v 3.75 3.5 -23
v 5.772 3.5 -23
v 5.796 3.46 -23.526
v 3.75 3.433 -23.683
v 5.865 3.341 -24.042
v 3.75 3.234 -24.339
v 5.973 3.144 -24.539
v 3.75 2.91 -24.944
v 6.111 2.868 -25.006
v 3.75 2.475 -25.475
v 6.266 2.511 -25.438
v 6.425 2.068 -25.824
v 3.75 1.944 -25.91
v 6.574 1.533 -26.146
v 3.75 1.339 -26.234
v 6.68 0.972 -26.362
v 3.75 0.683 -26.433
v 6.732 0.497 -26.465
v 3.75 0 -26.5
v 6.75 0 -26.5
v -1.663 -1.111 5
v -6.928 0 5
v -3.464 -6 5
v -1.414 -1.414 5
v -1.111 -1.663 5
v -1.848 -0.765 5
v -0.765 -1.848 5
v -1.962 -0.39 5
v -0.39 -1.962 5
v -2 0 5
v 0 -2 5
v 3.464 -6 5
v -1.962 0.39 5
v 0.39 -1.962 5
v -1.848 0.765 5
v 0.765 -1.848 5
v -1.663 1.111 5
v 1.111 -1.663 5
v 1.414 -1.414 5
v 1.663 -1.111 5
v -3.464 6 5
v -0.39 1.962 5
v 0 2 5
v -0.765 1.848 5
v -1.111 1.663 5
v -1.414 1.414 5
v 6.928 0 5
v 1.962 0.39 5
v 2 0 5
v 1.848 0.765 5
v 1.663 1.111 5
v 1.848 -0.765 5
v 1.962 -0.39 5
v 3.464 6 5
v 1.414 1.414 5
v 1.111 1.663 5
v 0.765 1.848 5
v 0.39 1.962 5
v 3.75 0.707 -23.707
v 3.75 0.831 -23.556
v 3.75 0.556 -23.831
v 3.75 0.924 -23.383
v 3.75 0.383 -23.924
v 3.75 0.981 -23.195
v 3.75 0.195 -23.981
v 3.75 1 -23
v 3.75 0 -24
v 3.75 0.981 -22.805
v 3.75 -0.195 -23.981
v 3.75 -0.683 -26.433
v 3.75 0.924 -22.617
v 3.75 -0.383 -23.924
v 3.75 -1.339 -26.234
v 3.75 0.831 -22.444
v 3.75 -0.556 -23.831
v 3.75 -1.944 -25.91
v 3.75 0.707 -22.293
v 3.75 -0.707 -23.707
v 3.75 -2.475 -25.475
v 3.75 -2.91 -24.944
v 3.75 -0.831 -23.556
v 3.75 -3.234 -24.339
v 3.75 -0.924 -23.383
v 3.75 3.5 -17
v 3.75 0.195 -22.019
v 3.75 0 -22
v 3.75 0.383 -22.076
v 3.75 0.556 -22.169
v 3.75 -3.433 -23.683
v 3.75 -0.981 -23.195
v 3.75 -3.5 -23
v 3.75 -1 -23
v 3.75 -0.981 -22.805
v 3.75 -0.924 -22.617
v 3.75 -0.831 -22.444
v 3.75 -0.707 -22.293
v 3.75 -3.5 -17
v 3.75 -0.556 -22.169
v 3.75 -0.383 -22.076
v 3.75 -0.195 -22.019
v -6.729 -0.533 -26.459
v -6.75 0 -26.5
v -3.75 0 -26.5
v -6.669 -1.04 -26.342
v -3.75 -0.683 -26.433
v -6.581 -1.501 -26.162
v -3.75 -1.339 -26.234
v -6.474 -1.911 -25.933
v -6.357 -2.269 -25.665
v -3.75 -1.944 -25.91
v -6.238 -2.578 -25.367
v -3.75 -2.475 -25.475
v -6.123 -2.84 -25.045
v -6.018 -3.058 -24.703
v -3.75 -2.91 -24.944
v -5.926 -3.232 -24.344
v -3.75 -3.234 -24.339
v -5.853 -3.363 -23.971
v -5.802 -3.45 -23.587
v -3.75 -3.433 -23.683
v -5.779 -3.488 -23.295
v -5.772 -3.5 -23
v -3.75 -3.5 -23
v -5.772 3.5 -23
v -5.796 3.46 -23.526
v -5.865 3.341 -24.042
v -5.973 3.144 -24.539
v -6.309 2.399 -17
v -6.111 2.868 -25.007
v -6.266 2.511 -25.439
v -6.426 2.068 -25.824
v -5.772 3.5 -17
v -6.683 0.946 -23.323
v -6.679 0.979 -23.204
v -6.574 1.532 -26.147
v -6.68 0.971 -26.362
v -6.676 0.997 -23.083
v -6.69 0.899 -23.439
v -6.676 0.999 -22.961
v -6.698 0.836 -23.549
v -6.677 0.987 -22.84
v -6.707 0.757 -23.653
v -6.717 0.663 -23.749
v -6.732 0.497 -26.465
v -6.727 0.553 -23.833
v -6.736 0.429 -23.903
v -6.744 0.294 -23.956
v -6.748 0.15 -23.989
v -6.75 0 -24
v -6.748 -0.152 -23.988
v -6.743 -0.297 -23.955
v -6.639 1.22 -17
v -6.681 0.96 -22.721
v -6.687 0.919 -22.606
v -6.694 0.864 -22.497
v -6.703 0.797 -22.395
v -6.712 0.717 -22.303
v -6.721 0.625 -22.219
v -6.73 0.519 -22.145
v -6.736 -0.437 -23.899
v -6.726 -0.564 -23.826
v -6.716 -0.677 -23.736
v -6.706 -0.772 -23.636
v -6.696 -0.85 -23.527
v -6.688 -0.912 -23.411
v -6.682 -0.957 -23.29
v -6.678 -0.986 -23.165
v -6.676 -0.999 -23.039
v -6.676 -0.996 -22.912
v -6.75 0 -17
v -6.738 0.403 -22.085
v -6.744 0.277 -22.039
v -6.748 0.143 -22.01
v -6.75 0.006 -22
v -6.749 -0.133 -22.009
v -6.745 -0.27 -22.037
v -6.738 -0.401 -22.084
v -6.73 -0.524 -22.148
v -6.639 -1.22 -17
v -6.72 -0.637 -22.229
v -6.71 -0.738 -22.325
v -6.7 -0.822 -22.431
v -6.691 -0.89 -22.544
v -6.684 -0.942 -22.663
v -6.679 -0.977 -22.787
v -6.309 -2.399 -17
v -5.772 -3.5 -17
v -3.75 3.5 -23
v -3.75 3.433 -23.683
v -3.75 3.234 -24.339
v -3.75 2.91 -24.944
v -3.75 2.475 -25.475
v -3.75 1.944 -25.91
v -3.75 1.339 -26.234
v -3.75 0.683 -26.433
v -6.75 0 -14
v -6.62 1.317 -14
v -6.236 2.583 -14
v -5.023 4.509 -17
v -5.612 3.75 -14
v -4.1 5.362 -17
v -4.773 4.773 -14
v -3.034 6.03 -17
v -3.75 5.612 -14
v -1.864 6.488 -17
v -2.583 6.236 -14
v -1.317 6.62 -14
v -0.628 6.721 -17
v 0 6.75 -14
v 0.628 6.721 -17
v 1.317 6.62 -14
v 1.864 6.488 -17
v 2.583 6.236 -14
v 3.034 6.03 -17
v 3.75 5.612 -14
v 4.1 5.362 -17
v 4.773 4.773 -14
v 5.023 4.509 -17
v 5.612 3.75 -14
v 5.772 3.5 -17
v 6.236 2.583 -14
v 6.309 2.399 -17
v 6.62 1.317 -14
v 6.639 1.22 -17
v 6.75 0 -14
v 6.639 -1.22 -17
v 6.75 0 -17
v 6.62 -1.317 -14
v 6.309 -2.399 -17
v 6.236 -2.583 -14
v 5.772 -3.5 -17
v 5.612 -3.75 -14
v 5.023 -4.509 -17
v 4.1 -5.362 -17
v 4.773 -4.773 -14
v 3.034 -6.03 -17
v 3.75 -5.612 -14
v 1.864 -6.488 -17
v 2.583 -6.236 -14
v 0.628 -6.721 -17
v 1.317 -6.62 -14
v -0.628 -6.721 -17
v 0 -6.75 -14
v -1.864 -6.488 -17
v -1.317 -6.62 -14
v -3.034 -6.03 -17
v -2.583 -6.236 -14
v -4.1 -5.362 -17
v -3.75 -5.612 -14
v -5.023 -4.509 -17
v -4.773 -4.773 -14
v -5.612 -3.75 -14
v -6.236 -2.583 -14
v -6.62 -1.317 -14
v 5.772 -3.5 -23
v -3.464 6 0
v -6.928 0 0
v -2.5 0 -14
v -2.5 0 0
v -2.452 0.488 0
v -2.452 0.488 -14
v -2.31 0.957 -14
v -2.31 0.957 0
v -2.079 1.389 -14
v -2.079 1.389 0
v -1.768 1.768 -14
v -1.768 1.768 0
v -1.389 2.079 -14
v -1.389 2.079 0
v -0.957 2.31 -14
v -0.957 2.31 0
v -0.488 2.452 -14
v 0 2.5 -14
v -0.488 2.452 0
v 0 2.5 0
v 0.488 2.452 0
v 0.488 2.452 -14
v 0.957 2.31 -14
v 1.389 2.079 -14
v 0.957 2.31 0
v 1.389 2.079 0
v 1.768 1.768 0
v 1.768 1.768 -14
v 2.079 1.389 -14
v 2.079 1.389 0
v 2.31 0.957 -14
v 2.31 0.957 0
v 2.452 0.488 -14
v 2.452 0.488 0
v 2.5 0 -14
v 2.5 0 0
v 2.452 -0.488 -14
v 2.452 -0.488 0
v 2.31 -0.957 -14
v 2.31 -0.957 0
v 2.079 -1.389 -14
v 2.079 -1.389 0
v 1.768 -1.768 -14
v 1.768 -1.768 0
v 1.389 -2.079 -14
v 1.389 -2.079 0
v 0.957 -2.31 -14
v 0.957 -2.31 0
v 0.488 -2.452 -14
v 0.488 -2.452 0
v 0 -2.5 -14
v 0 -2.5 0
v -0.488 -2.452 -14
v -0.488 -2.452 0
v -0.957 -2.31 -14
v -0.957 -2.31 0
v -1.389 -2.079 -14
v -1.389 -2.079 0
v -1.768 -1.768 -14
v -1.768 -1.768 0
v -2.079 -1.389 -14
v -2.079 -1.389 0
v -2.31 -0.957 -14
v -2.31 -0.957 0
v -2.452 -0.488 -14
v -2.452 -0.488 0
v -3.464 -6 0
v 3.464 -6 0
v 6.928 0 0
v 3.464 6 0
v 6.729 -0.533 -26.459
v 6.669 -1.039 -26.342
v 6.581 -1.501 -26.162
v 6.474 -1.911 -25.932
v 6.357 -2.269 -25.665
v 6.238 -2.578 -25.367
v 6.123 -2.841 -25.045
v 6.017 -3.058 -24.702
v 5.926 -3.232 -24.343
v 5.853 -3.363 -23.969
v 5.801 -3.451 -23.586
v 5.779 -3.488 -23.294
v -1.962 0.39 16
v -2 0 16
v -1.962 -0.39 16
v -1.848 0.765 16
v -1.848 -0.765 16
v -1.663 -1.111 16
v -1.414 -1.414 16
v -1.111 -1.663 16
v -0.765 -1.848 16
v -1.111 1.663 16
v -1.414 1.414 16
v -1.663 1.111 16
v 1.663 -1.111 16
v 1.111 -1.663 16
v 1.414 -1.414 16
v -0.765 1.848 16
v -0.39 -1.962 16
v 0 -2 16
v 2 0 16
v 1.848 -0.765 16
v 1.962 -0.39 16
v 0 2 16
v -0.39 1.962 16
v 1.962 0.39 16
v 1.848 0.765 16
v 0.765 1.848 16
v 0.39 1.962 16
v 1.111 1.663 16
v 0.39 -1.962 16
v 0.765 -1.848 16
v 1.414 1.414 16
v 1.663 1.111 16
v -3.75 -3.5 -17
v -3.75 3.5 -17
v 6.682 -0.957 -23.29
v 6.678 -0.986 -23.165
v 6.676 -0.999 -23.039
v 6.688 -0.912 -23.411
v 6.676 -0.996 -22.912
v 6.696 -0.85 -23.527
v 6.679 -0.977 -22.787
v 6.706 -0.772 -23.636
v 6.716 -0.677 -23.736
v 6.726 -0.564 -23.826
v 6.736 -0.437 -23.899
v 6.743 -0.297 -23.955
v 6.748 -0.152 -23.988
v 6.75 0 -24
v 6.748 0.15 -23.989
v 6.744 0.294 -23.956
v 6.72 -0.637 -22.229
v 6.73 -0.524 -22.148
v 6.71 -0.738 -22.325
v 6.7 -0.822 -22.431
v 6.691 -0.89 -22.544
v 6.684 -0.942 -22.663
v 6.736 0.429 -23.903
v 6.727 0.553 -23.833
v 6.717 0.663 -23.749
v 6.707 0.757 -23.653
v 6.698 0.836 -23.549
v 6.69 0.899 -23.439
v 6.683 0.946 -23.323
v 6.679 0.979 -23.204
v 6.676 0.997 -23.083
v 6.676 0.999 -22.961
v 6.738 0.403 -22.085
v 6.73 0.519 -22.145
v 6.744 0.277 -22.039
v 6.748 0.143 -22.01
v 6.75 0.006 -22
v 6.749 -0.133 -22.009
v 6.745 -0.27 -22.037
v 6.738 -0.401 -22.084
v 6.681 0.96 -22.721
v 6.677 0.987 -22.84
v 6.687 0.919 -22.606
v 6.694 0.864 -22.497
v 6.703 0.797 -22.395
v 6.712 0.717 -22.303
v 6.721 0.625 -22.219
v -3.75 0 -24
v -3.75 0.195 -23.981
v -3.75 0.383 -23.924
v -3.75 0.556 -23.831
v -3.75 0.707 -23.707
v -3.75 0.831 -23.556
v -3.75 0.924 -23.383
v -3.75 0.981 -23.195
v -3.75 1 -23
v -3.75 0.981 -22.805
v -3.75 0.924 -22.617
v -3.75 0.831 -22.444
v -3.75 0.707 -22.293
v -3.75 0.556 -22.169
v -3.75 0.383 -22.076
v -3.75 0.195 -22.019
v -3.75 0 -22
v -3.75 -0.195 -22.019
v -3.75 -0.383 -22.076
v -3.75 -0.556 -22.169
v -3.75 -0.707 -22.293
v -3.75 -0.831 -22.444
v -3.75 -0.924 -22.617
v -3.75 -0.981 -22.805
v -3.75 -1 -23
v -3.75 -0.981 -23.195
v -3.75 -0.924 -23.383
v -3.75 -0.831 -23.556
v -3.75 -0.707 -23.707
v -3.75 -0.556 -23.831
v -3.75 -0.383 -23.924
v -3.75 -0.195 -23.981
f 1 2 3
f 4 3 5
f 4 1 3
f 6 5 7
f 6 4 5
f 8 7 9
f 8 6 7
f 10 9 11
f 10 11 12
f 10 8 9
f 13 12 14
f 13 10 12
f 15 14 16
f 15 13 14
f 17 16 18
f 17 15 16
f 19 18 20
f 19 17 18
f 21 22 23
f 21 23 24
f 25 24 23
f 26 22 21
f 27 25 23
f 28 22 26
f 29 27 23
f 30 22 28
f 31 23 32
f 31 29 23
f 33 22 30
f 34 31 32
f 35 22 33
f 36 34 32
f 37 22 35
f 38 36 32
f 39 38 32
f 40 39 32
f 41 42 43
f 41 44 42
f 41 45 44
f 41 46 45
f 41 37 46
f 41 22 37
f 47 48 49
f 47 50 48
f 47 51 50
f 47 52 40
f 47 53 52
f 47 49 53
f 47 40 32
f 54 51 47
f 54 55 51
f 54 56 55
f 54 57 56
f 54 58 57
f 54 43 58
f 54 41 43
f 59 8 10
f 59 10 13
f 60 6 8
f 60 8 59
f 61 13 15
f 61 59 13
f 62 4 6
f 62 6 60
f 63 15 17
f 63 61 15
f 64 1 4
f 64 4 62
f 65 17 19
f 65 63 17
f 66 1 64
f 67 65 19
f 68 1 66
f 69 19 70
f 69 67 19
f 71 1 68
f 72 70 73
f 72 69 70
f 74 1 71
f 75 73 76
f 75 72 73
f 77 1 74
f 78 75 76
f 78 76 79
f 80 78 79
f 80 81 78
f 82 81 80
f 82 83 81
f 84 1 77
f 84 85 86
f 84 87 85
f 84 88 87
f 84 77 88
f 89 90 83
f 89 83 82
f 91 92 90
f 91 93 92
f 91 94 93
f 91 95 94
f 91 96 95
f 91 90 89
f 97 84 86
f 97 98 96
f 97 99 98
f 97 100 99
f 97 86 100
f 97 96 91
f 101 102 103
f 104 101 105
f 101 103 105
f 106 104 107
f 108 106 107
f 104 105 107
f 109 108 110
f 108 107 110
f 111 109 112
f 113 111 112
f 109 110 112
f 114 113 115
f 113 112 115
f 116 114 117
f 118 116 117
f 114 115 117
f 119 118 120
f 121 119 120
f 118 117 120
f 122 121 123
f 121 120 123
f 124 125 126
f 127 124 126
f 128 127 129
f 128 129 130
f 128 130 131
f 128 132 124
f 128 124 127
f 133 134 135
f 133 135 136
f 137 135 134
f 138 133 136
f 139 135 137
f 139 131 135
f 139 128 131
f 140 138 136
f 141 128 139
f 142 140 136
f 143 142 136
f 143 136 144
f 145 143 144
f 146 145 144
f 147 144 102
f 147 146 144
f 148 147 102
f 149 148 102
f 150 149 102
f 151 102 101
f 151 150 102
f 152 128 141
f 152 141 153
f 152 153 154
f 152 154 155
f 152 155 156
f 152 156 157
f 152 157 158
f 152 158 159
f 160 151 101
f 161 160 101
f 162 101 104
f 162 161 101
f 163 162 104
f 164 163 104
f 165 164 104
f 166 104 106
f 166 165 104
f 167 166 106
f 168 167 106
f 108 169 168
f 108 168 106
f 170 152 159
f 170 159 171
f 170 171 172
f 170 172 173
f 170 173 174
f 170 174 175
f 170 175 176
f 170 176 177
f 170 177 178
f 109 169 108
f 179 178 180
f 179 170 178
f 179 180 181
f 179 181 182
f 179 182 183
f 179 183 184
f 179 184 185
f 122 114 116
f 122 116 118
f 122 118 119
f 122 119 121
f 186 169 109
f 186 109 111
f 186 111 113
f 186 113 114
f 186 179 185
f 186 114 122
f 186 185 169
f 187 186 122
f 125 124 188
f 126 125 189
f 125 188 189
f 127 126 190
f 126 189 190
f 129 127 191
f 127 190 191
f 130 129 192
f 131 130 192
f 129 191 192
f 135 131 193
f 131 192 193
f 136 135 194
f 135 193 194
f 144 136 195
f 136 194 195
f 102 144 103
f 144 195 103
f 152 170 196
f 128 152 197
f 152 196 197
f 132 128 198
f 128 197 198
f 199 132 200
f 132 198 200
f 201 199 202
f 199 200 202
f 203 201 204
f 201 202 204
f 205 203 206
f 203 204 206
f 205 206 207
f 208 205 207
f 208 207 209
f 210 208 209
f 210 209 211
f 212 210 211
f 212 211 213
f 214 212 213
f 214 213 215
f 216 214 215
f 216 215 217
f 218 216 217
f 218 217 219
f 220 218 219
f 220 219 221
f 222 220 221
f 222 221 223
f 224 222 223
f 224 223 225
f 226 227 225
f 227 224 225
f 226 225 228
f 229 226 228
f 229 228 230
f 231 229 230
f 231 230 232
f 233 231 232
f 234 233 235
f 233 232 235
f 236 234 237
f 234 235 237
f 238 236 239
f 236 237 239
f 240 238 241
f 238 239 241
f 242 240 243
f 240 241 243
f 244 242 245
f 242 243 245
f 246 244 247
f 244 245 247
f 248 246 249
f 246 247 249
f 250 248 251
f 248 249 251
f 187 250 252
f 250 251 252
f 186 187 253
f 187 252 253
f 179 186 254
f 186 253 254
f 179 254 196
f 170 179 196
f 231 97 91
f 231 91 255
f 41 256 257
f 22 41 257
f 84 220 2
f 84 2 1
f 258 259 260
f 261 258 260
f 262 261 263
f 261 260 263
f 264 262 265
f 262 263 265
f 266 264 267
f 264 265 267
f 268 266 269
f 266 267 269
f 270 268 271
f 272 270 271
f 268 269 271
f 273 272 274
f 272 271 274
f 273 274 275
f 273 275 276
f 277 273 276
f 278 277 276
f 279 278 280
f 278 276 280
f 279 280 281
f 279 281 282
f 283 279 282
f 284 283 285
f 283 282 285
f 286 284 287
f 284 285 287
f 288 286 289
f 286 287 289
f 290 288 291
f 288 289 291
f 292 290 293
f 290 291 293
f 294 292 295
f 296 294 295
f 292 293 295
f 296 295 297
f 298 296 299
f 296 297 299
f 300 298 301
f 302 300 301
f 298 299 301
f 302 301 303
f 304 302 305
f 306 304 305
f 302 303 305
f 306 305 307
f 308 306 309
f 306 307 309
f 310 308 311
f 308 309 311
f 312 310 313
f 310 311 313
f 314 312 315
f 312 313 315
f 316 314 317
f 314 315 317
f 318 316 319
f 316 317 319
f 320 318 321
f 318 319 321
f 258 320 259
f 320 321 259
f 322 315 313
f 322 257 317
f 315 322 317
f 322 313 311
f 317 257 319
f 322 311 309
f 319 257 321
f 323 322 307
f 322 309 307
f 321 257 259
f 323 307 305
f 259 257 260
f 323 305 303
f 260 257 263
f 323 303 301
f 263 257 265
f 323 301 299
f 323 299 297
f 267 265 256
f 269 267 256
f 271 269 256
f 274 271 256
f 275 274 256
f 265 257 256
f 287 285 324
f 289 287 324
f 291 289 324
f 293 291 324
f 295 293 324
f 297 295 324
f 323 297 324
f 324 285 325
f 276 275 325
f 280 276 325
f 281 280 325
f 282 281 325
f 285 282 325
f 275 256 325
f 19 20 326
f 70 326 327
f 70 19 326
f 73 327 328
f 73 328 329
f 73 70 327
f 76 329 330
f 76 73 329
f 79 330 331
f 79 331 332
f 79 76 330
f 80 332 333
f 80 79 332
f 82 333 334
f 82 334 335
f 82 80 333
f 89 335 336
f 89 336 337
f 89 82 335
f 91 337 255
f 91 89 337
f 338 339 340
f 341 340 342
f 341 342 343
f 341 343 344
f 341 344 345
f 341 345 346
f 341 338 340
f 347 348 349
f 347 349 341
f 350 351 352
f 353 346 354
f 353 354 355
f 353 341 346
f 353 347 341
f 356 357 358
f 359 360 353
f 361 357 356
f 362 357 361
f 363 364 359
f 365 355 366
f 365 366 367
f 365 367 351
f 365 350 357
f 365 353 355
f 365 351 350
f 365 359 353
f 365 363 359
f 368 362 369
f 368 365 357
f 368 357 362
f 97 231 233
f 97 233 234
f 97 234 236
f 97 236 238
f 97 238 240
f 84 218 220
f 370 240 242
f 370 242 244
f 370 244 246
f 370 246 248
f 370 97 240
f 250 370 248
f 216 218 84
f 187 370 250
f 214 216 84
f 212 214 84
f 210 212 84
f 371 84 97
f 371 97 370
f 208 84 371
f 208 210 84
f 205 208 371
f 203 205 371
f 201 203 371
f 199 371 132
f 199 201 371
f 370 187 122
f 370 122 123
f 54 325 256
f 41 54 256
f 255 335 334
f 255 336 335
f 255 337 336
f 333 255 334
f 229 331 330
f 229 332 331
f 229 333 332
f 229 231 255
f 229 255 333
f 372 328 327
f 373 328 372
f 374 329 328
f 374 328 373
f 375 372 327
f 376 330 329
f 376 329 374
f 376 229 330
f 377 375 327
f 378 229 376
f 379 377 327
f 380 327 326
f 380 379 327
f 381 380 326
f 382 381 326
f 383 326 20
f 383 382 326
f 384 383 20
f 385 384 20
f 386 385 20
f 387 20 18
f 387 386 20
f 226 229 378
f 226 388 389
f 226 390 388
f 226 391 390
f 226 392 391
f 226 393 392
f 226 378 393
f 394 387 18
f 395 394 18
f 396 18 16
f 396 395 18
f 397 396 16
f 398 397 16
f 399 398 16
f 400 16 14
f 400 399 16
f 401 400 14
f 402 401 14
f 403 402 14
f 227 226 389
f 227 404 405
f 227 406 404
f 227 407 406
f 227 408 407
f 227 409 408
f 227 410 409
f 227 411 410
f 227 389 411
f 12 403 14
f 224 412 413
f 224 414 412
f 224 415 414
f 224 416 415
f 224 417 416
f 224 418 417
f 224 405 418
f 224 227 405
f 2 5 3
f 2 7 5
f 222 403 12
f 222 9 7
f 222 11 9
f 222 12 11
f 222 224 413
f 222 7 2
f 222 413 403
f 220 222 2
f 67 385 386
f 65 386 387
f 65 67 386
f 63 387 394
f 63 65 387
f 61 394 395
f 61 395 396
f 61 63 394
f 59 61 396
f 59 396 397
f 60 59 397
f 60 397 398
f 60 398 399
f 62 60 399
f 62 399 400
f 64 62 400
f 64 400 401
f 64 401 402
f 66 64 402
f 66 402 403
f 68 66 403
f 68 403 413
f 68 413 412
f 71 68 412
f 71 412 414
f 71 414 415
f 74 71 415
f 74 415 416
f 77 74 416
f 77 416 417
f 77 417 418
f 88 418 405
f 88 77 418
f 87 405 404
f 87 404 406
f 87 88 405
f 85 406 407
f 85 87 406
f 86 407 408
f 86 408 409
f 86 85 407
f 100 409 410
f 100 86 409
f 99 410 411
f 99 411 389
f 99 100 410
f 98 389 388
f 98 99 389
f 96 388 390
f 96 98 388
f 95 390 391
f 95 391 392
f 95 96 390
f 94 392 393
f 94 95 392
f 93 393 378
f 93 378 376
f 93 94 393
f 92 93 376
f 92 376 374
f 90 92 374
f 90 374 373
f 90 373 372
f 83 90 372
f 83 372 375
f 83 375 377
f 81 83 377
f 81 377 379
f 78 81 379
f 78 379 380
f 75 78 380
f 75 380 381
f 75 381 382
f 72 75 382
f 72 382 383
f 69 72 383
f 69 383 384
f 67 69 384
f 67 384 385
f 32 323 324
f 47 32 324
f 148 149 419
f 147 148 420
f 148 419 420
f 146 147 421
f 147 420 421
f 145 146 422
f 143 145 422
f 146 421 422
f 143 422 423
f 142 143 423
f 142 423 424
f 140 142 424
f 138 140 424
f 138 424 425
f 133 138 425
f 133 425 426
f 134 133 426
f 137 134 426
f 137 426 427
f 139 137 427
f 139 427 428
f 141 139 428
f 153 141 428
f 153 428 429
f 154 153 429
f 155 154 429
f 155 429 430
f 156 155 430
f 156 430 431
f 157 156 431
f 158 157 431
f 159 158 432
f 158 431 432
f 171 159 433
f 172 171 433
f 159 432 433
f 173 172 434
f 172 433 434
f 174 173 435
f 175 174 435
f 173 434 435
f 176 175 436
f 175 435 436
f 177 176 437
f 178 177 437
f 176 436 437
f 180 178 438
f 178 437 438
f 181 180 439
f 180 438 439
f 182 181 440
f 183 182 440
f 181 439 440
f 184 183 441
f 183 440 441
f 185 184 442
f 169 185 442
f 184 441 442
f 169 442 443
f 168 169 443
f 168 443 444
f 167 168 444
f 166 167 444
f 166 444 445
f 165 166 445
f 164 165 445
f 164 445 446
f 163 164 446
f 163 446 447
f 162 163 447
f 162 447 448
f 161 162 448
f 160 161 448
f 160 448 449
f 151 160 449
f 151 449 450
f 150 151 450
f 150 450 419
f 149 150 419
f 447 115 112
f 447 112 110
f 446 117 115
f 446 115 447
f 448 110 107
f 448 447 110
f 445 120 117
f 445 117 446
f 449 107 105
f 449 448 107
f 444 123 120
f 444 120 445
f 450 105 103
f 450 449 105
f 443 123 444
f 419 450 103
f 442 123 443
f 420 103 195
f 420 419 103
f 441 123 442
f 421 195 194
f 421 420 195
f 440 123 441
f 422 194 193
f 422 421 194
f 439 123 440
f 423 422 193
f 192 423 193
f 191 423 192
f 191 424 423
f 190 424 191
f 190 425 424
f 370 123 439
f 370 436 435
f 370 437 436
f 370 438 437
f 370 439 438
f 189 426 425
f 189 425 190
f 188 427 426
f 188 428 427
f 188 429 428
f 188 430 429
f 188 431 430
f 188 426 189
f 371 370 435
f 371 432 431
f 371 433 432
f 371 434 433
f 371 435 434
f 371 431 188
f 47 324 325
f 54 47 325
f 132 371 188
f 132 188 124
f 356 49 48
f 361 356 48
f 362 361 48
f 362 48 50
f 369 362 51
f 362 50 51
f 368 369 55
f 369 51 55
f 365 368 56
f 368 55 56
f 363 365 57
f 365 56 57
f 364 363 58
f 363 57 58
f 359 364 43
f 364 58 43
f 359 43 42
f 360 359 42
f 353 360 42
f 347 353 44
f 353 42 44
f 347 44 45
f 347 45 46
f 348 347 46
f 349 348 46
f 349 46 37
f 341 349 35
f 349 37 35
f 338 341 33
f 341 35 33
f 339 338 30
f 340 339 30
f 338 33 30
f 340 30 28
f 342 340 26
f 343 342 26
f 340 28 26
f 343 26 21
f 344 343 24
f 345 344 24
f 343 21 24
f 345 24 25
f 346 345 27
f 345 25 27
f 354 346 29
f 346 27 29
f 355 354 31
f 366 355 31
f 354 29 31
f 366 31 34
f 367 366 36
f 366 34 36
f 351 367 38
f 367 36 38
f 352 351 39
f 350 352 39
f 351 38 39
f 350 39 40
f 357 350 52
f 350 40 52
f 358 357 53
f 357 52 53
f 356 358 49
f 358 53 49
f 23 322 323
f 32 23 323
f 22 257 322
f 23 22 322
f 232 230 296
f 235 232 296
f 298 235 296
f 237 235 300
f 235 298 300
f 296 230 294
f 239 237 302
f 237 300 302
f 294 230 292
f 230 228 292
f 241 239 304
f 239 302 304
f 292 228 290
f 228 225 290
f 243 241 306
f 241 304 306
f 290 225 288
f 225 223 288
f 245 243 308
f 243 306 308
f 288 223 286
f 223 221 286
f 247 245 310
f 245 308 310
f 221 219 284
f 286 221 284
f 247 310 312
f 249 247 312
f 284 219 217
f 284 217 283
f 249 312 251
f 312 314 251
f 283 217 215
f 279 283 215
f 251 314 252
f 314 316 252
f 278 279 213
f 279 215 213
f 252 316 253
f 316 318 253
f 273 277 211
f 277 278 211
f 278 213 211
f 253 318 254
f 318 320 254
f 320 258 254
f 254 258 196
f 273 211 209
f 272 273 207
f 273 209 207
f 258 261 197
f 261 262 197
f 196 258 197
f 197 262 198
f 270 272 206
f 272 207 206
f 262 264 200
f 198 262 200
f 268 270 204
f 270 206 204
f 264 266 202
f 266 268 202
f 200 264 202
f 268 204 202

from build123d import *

# Parameters (mm, degrees)
HEXAGON_DEPTH            = 5
SKETCH3_R                = 2
SCREW_POST_DEPTH         = 11
SKETCH4_R                = 2.5
BEARING_SECTION_DEPTH    = 14
SKETCH5_R                = 6.75
U_JOINT_BASE_DEPTH       = 3
U_JOINT_STANDUPS_DEPTH   = 9.5
STANDUP_ROUND_DEPTH      = 7.928203
STANDUP_ROUND_DEPTH_BACK = 7.928203
SKETCH8_R                = 1
BALL_HOLES_DEPTH         = 7.928203
BALL_HOLES_DEPTH_BACK    = 7.928203


with BuildPart() as part:
    # Sketch2 → Hexagon (new body)
    with BuildSketch(Plane.XY):
        Polygon((3.464102, -6), (6.928203, 0), (3.464102, 6), (-3.464102, 6), (-6.928203, 0), (-3.464102, -6), align=None)
    extrude(amount=HEXAGON_DEPTH)

    # Sketch3 → Screw Post (add)
    with BuildSketch(Plane.XY.offset(5)):
        Circle(SKETCH3_R)
    extrude(amount=SCREW_POST_DEPTH)

    # Sketch4 → Bearing Section (add)
    with BuildSketch(Plane(origin=(0, 0, 0), x_dir=(-1, 0, 0), z_dir=(0, 0, -1))):
        Circle(SKETCH4_R)
    extrude(amount=BEARING_SECTION_DEPTH)

    # Sketch5 → U Joint Base (add)
    with BuildSketch(Plane(origin=(0, 0, -14), x_dir=(-1, 0, 0), z_dir=(0, 0, -1))):
        Circle(SKETCH5_R)
    extrude(amount=U_JOINT_BASE_DEPTH)

    # Sketch6 → U Joint Standups (add)
    with BuildSketch(Plane(origin=(0, 0, -17), x_dir=(-1, 0, 0), z_dir=(0, 0, -1))):
        with BuildLine():
            Line((-5.771698, 3.5), (-3.75, 3.5))
            Line((-3.75, 3.5), (-3.75, -3.5))
            Line((-3.75, -3.5), (-5.771698, -3.5))
            ThreePointArc((-5.771698, -3.5), (-6.75, 0), (-5.771698, 3.5))
        make_face()
        with BuildLine():
            Line((3.75, -3.5), (3.75, 3.5))
            Line((3.75, 3.5), (5.771698, 3.5))
            ThreePointArc((5.771698, 3.5), (6.75, 0), (5.771698, -3.5))
            Line((5.771698, -3.5), (3.75, -3.5))
        make_face()
    extrude(amount=U_JOINT_STANDUPS_DEPTH)

    # Sketch7 → Standup Round (cut, two sides)
    with BuildSketch(Plane(origin=(0, 0, 0), x_dir=(0, 0, -1), z_dir=(1, 0, 0))) as standup_round_sk:
        with BuildLine():
            Line((26.5, -3.5), (26.5, 0))
            ThreePointArc((26.5, 0), (25.474874, -2.474874), (23, -3.5))
            Line((23, -3.5), (26.5, -3.5))
        make_face()
        with BuildLine():
            Line((26.5, 3.5), (23, 3.5))
            ThreePointArc((23, 3.5), (25.474874, 2.474874), (26.5, 0))
            Line((26.5, 0), (26.5, 3.5))
        make_face()
    extrude(amount=STANDUP_ROUND_DEPTH, mode=Mode.SUBTRACT)
    extrude(standup_round_sk.sketch, amount=-STANDUP_ROUND_DEPTH_BACK, mode=Mode.SUBTRACT)

    # Sketch8 → Ball Holes (cut, two sides)
    with BuildSketch(Plane(origin=(0, 0, 0), x_dir=(0, 0, -1), z_dir=(1, 0, 0))) as ball_holes_sk:
        with Locations((23, 0)):
            Circle(SKETCH8_R)
    extrude(amount=BALL_HOLES_DEPTH, mode=Mode.SUBTRACT)
    extrude(ball_holes_sk.sketch, amount=-BALL_HOLES_DEPTH_BACK, mode=Mode.SUBTRACT)


solid = part.part
